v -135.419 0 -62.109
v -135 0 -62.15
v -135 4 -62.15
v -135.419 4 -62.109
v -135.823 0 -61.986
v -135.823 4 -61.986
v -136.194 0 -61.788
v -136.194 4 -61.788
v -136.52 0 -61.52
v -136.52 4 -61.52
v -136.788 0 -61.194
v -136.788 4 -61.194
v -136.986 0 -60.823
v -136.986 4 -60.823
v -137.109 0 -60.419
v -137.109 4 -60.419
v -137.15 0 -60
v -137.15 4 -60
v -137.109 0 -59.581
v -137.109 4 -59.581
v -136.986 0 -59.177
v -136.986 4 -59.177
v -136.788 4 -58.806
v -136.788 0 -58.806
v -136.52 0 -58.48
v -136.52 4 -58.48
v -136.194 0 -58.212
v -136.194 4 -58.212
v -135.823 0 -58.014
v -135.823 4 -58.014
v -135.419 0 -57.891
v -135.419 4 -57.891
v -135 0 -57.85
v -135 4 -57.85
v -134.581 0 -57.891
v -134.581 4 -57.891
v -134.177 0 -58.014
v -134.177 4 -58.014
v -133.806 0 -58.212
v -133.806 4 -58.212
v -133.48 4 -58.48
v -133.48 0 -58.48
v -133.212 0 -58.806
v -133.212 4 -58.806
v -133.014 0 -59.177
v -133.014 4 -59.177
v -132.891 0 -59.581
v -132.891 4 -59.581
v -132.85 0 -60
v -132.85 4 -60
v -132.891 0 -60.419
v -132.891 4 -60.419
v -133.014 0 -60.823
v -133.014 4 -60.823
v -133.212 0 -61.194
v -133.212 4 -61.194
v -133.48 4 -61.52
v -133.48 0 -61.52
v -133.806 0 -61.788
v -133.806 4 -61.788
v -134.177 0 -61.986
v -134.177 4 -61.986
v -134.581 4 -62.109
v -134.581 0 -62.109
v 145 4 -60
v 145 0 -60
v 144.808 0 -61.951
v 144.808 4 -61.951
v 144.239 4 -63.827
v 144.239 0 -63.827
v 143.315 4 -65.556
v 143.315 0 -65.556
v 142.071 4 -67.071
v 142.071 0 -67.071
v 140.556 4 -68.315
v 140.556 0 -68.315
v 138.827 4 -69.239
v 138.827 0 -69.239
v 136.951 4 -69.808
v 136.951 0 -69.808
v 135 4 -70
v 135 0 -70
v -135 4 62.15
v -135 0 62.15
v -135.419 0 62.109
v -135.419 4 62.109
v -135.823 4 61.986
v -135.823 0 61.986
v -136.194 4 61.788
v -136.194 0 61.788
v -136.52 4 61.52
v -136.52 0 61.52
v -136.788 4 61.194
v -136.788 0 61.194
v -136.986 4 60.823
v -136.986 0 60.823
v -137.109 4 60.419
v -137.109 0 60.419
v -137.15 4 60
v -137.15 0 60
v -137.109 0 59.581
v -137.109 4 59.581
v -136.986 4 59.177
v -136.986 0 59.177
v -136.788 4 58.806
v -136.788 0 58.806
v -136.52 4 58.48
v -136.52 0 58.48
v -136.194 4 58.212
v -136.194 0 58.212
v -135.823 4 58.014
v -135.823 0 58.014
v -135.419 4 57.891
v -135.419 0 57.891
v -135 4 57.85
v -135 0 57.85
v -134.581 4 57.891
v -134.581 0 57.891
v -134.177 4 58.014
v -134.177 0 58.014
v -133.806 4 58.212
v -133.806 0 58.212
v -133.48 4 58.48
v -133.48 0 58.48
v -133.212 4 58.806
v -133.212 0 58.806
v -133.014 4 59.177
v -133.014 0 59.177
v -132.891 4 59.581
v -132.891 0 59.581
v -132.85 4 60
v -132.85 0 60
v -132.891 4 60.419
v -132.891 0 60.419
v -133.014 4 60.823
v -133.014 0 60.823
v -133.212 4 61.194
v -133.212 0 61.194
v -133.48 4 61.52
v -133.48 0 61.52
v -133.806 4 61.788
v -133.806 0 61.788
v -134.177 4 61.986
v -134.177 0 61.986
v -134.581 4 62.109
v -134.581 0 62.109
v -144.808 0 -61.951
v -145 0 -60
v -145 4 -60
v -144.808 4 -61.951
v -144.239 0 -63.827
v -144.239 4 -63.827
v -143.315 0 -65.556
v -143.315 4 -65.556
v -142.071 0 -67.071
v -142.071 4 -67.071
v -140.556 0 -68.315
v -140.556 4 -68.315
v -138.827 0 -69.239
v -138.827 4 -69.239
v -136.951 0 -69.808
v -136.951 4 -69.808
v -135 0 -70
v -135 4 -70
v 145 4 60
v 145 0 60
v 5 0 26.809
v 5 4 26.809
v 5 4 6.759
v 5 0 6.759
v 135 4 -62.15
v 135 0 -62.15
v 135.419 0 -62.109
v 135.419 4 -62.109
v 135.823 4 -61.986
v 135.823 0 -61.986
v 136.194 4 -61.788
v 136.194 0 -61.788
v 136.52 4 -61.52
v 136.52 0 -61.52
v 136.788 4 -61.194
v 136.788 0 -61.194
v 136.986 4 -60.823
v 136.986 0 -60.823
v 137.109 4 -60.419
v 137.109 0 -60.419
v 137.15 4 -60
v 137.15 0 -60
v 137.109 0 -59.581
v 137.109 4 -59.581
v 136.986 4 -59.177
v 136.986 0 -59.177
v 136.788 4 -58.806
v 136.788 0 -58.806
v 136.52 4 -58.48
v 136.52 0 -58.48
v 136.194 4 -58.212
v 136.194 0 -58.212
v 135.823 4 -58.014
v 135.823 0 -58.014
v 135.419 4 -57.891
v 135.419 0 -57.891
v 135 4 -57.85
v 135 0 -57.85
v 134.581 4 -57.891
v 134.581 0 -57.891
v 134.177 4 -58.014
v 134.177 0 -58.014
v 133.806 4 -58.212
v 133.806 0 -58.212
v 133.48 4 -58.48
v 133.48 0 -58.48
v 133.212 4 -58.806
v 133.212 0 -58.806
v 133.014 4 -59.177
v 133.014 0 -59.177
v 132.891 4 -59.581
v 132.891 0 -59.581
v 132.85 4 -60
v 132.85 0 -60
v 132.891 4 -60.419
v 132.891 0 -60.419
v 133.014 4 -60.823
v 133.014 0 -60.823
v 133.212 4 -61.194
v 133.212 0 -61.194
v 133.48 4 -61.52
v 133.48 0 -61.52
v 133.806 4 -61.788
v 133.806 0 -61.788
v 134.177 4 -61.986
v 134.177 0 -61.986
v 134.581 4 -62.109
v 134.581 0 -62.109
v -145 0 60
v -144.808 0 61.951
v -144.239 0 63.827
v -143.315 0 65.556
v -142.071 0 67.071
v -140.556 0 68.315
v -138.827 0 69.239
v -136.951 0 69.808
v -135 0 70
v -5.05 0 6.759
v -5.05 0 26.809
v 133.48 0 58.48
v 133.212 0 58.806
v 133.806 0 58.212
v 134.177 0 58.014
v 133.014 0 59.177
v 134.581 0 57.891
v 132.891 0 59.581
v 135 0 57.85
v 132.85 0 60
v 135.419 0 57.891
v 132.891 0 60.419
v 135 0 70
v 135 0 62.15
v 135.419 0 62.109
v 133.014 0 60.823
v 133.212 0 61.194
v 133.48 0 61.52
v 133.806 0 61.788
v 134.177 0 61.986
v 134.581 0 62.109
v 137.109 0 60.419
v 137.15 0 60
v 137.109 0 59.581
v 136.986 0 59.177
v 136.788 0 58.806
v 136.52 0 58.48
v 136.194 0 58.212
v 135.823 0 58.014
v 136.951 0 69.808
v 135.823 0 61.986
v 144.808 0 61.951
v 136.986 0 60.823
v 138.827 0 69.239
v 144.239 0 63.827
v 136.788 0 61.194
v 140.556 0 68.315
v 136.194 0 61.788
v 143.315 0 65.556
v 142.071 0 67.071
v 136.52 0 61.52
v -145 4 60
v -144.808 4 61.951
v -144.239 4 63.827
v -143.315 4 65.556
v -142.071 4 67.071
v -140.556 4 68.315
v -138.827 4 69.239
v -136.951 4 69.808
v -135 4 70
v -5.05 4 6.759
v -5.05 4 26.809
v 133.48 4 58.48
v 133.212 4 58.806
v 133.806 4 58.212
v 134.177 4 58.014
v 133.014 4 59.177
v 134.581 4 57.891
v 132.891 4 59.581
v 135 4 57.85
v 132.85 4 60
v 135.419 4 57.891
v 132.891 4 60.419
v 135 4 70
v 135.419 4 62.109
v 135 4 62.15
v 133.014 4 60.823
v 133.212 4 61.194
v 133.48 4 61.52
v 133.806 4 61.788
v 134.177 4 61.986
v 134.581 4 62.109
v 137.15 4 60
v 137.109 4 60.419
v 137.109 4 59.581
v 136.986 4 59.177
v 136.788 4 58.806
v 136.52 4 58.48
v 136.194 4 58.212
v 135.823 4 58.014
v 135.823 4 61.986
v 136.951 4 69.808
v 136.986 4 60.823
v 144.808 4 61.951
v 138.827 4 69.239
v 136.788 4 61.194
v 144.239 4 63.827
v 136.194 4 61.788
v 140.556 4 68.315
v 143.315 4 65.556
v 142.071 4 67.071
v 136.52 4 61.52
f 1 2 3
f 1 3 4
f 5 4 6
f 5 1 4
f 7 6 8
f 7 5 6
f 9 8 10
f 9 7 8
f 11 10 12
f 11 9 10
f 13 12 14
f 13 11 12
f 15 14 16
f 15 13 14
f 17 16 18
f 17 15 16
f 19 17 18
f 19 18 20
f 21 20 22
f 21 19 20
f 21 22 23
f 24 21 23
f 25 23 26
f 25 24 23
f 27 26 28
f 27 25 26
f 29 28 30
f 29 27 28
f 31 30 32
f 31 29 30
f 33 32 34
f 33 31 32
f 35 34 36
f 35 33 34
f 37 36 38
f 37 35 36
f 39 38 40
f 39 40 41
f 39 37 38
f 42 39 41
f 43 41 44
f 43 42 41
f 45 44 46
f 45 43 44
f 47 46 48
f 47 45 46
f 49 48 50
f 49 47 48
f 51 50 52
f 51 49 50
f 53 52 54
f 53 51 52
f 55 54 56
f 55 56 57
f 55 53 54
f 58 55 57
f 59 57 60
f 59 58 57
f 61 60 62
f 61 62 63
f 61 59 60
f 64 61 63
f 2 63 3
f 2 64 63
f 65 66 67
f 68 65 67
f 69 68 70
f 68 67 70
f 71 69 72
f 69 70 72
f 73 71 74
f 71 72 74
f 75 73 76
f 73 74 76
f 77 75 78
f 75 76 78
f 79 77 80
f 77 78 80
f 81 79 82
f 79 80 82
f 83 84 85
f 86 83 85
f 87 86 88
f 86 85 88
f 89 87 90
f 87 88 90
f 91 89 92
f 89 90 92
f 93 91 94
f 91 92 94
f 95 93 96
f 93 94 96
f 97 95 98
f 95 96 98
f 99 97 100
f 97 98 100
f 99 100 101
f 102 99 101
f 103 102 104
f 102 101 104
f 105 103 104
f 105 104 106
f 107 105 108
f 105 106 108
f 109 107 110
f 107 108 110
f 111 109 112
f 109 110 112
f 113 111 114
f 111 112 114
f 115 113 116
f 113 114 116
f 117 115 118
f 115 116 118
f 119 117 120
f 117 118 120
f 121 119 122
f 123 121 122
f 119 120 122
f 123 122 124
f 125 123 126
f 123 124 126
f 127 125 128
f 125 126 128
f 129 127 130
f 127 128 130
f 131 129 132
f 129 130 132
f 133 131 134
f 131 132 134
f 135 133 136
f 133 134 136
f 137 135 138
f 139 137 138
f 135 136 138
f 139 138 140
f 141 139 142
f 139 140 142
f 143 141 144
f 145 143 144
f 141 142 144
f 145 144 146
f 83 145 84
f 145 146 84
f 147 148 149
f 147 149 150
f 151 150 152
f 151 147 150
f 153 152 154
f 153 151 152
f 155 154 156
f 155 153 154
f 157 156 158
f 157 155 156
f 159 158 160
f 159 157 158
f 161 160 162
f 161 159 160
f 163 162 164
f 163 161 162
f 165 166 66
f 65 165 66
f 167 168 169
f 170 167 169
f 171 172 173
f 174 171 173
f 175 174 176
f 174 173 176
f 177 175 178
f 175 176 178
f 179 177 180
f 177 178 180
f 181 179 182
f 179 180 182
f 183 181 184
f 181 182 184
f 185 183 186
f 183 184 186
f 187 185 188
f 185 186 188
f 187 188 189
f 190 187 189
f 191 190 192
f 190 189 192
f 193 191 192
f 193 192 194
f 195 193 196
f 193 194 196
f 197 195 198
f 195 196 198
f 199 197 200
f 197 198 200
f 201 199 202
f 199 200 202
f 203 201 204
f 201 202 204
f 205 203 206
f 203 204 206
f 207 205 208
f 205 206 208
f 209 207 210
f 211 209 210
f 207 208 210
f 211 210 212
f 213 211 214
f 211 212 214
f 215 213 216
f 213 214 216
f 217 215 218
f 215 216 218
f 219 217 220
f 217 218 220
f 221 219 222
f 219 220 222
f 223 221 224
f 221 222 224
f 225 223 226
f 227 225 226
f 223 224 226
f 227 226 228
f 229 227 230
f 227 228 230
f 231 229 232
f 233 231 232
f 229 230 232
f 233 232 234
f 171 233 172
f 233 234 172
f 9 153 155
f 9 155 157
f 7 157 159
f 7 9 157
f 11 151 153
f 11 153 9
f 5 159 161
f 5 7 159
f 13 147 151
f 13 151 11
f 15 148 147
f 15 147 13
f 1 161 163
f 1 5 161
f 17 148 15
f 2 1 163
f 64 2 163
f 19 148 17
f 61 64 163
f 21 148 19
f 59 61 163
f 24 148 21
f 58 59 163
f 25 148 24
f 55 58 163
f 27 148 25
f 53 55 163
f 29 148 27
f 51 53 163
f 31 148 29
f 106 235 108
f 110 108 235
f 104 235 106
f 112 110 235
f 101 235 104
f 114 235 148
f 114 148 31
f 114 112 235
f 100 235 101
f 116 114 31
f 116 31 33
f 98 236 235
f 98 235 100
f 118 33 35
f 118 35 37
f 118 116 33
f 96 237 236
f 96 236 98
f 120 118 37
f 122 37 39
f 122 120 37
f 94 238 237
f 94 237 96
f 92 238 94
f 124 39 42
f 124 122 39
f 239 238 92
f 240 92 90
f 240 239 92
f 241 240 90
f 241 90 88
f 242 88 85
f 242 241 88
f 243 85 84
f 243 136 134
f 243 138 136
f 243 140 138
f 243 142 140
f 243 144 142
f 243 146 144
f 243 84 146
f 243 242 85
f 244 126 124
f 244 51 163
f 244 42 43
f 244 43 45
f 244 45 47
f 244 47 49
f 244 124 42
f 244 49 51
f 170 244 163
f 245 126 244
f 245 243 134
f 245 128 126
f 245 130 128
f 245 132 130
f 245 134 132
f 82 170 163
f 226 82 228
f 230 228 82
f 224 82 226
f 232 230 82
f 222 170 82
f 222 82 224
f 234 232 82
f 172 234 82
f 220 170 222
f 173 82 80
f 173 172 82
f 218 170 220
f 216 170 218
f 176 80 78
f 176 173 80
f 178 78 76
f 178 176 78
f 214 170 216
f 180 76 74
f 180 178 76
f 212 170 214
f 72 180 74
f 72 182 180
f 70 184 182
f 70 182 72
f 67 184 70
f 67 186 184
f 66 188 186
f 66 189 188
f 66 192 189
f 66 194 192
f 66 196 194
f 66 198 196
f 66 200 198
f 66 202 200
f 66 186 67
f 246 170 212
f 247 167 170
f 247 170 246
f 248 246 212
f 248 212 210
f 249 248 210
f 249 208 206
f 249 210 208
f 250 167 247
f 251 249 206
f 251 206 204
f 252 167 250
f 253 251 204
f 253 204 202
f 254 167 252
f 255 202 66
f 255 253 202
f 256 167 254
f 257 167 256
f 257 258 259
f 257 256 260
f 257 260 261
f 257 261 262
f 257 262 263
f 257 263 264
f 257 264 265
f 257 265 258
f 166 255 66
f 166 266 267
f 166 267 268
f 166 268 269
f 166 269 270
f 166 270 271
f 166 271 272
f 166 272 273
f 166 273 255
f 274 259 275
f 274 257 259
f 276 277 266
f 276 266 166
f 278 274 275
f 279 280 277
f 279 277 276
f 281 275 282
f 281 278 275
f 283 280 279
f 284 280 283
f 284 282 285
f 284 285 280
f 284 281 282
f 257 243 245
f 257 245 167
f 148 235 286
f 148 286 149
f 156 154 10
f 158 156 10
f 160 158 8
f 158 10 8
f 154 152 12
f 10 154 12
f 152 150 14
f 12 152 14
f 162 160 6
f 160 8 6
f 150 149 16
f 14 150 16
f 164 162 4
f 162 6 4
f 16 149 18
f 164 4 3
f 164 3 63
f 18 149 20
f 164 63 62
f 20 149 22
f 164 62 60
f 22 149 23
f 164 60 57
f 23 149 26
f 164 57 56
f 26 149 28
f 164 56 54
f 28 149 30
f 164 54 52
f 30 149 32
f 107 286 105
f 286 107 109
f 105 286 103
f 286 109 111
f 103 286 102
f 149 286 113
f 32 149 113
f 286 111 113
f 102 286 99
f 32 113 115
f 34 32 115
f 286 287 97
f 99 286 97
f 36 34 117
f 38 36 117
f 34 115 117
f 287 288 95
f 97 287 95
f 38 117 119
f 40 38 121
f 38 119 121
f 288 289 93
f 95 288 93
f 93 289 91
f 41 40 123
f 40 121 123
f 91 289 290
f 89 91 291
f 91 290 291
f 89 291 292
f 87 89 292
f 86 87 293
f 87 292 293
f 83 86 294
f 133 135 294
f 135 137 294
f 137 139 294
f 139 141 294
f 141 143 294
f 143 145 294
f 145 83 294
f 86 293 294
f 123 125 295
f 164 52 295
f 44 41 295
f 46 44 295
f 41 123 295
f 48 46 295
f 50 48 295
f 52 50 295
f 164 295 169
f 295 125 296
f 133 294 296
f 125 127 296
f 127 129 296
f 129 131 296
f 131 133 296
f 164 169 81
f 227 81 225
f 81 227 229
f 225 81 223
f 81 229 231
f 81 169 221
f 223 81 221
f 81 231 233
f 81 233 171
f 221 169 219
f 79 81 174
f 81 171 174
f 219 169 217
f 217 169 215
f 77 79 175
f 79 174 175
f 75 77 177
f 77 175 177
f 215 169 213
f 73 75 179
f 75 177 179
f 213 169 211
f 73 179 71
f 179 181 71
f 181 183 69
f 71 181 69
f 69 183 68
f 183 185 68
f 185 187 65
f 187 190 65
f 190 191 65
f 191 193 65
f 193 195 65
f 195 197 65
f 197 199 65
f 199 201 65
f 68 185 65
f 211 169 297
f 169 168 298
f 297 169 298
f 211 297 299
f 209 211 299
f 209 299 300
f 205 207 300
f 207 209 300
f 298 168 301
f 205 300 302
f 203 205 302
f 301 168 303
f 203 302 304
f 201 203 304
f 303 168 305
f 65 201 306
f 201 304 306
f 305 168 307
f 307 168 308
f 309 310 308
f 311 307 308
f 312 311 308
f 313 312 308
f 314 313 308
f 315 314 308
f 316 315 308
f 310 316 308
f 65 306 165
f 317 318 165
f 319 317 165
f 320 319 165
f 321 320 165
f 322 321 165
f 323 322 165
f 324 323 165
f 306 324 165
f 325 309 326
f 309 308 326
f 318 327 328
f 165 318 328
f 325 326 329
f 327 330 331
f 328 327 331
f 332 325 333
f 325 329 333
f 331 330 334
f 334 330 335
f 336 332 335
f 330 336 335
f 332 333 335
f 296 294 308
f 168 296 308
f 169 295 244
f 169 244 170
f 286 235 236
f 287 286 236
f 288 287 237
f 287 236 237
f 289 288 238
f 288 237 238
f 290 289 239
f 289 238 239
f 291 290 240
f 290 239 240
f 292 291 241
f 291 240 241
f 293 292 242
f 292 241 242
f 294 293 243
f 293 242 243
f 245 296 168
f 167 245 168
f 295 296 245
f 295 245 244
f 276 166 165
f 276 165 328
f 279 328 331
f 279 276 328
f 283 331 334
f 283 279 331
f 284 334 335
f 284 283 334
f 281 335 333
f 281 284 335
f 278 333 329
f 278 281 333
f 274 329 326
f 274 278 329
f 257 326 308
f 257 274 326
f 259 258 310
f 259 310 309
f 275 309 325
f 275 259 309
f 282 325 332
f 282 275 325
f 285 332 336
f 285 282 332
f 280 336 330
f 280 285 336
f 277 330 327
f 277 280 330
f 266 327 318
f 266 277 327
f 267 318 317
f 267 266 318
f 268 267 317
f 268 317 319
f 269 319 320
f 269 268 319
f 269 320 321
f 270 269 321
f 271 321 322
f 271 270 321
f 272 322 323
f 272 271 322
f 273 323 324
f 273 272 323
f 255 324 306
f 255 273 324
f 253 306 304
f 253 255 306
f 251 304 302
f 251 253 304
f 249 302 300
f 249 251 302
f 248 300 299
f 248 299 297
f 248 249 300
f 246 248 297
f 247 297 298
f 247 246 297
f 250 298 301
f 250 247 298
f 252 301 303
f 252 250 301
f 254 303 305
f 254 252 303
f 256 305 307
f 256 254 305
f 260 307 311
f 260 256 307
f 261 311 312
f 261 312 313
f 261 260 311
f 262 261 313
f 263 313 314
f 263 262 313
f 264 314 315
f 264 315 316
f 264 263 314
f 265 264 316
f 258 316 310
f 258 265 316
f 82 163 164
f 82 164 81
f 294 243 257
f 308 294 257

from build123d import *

# Parameters (mm, degrees)
SKETCH1_R               = 2.15
BOSS_EXTRUDE1_DEPTH     = 4
MIRROR2_COPY_1_SKETCH_R = 2.15
MIRROR2_COPY_1_DEPTH    = 4
SKETCH2_W               = 10.05
SKETCH2_H               = 20.05
CUT_EXTRUDE5_DEPTH      = 162.062099825


with BuildPart() as part:
    # Sketch1 → Boss-Extrude1 (new body)
    with BuildSketch(Plane(origin=(0, 0, 0), x_dir=(1, 0, 0), z_dir=(0, 1, 0))):
        with BuildLine():
            Line((135, -70), (0, -70))
            Line((0, -70), (0, 0))
            Line((0, 0), (145, 0))
            Line((145, 0), (145, -60))
            ThreePointArc((145, -60), (142.071067812, -67.071067812), (135, -70))
        make_face()
        with Locations(Location((135, -60, 0), (0, 0, 270))):
            Circle(SKETCH1_R, mode=Mode.SUBTRACT)
    boss_extrude1 = extrude(amount=BOSS_EXTRUDE1_DEPTH)

    # Mirror1: Boss-Extrude1 across plane
    add(boss_extrude1.mirror(Plane(origin=(0, 0, 0), x_dir=(0, 0, 1), z_dir=(1, 0, 0))))

    # Mirror2: Boss-Extrude1 across plane
    add(boss_extrude1.mirror(Plane.XY))

    # Mirror2 copy 1 sketch → Mirror2 copy 1 (add)
    with BuildSketch(Plane(origin=(0, 0, 0), x_dir=(-1, 0, 0), z_dir=(0, 1, 0))):
        with BuildLine():
            Line((135, -70), (0, -70))
            Line((0, -70), (0, 0))
            Line((0, 0), (145, 0))
            Line((145, 0), (145, -60))
            ThreePointArc((145, -60), (142.071067812, -67.071067812), (135, -70))
        make_face()
        with Locations(Location((135, -60, 0), (0, 0, 270))):
            Circle(MIRROR2_COPY_1_SKETCH_R, mode=Mode.SUBTRACT)
    extrude(amount=MIRROR2_COPY_1_DEPTH)

    # Sketch2 → Cut-Extrude5 (cut, through all)
    with BuildSketch(Plane(origin=(0, 4, 0), x_dir=(1, 0, 0), z_dir=(0, 1, 0))):
        with Locations((-0.025, -16.784138883)):
            Rectangle(SKETCH2_W, SKETCH2_H)
    extrude(amount=-CUT_EXTRUDE5_DEPTH, mode=Mode.SUBTRACT)


solid = part.part
